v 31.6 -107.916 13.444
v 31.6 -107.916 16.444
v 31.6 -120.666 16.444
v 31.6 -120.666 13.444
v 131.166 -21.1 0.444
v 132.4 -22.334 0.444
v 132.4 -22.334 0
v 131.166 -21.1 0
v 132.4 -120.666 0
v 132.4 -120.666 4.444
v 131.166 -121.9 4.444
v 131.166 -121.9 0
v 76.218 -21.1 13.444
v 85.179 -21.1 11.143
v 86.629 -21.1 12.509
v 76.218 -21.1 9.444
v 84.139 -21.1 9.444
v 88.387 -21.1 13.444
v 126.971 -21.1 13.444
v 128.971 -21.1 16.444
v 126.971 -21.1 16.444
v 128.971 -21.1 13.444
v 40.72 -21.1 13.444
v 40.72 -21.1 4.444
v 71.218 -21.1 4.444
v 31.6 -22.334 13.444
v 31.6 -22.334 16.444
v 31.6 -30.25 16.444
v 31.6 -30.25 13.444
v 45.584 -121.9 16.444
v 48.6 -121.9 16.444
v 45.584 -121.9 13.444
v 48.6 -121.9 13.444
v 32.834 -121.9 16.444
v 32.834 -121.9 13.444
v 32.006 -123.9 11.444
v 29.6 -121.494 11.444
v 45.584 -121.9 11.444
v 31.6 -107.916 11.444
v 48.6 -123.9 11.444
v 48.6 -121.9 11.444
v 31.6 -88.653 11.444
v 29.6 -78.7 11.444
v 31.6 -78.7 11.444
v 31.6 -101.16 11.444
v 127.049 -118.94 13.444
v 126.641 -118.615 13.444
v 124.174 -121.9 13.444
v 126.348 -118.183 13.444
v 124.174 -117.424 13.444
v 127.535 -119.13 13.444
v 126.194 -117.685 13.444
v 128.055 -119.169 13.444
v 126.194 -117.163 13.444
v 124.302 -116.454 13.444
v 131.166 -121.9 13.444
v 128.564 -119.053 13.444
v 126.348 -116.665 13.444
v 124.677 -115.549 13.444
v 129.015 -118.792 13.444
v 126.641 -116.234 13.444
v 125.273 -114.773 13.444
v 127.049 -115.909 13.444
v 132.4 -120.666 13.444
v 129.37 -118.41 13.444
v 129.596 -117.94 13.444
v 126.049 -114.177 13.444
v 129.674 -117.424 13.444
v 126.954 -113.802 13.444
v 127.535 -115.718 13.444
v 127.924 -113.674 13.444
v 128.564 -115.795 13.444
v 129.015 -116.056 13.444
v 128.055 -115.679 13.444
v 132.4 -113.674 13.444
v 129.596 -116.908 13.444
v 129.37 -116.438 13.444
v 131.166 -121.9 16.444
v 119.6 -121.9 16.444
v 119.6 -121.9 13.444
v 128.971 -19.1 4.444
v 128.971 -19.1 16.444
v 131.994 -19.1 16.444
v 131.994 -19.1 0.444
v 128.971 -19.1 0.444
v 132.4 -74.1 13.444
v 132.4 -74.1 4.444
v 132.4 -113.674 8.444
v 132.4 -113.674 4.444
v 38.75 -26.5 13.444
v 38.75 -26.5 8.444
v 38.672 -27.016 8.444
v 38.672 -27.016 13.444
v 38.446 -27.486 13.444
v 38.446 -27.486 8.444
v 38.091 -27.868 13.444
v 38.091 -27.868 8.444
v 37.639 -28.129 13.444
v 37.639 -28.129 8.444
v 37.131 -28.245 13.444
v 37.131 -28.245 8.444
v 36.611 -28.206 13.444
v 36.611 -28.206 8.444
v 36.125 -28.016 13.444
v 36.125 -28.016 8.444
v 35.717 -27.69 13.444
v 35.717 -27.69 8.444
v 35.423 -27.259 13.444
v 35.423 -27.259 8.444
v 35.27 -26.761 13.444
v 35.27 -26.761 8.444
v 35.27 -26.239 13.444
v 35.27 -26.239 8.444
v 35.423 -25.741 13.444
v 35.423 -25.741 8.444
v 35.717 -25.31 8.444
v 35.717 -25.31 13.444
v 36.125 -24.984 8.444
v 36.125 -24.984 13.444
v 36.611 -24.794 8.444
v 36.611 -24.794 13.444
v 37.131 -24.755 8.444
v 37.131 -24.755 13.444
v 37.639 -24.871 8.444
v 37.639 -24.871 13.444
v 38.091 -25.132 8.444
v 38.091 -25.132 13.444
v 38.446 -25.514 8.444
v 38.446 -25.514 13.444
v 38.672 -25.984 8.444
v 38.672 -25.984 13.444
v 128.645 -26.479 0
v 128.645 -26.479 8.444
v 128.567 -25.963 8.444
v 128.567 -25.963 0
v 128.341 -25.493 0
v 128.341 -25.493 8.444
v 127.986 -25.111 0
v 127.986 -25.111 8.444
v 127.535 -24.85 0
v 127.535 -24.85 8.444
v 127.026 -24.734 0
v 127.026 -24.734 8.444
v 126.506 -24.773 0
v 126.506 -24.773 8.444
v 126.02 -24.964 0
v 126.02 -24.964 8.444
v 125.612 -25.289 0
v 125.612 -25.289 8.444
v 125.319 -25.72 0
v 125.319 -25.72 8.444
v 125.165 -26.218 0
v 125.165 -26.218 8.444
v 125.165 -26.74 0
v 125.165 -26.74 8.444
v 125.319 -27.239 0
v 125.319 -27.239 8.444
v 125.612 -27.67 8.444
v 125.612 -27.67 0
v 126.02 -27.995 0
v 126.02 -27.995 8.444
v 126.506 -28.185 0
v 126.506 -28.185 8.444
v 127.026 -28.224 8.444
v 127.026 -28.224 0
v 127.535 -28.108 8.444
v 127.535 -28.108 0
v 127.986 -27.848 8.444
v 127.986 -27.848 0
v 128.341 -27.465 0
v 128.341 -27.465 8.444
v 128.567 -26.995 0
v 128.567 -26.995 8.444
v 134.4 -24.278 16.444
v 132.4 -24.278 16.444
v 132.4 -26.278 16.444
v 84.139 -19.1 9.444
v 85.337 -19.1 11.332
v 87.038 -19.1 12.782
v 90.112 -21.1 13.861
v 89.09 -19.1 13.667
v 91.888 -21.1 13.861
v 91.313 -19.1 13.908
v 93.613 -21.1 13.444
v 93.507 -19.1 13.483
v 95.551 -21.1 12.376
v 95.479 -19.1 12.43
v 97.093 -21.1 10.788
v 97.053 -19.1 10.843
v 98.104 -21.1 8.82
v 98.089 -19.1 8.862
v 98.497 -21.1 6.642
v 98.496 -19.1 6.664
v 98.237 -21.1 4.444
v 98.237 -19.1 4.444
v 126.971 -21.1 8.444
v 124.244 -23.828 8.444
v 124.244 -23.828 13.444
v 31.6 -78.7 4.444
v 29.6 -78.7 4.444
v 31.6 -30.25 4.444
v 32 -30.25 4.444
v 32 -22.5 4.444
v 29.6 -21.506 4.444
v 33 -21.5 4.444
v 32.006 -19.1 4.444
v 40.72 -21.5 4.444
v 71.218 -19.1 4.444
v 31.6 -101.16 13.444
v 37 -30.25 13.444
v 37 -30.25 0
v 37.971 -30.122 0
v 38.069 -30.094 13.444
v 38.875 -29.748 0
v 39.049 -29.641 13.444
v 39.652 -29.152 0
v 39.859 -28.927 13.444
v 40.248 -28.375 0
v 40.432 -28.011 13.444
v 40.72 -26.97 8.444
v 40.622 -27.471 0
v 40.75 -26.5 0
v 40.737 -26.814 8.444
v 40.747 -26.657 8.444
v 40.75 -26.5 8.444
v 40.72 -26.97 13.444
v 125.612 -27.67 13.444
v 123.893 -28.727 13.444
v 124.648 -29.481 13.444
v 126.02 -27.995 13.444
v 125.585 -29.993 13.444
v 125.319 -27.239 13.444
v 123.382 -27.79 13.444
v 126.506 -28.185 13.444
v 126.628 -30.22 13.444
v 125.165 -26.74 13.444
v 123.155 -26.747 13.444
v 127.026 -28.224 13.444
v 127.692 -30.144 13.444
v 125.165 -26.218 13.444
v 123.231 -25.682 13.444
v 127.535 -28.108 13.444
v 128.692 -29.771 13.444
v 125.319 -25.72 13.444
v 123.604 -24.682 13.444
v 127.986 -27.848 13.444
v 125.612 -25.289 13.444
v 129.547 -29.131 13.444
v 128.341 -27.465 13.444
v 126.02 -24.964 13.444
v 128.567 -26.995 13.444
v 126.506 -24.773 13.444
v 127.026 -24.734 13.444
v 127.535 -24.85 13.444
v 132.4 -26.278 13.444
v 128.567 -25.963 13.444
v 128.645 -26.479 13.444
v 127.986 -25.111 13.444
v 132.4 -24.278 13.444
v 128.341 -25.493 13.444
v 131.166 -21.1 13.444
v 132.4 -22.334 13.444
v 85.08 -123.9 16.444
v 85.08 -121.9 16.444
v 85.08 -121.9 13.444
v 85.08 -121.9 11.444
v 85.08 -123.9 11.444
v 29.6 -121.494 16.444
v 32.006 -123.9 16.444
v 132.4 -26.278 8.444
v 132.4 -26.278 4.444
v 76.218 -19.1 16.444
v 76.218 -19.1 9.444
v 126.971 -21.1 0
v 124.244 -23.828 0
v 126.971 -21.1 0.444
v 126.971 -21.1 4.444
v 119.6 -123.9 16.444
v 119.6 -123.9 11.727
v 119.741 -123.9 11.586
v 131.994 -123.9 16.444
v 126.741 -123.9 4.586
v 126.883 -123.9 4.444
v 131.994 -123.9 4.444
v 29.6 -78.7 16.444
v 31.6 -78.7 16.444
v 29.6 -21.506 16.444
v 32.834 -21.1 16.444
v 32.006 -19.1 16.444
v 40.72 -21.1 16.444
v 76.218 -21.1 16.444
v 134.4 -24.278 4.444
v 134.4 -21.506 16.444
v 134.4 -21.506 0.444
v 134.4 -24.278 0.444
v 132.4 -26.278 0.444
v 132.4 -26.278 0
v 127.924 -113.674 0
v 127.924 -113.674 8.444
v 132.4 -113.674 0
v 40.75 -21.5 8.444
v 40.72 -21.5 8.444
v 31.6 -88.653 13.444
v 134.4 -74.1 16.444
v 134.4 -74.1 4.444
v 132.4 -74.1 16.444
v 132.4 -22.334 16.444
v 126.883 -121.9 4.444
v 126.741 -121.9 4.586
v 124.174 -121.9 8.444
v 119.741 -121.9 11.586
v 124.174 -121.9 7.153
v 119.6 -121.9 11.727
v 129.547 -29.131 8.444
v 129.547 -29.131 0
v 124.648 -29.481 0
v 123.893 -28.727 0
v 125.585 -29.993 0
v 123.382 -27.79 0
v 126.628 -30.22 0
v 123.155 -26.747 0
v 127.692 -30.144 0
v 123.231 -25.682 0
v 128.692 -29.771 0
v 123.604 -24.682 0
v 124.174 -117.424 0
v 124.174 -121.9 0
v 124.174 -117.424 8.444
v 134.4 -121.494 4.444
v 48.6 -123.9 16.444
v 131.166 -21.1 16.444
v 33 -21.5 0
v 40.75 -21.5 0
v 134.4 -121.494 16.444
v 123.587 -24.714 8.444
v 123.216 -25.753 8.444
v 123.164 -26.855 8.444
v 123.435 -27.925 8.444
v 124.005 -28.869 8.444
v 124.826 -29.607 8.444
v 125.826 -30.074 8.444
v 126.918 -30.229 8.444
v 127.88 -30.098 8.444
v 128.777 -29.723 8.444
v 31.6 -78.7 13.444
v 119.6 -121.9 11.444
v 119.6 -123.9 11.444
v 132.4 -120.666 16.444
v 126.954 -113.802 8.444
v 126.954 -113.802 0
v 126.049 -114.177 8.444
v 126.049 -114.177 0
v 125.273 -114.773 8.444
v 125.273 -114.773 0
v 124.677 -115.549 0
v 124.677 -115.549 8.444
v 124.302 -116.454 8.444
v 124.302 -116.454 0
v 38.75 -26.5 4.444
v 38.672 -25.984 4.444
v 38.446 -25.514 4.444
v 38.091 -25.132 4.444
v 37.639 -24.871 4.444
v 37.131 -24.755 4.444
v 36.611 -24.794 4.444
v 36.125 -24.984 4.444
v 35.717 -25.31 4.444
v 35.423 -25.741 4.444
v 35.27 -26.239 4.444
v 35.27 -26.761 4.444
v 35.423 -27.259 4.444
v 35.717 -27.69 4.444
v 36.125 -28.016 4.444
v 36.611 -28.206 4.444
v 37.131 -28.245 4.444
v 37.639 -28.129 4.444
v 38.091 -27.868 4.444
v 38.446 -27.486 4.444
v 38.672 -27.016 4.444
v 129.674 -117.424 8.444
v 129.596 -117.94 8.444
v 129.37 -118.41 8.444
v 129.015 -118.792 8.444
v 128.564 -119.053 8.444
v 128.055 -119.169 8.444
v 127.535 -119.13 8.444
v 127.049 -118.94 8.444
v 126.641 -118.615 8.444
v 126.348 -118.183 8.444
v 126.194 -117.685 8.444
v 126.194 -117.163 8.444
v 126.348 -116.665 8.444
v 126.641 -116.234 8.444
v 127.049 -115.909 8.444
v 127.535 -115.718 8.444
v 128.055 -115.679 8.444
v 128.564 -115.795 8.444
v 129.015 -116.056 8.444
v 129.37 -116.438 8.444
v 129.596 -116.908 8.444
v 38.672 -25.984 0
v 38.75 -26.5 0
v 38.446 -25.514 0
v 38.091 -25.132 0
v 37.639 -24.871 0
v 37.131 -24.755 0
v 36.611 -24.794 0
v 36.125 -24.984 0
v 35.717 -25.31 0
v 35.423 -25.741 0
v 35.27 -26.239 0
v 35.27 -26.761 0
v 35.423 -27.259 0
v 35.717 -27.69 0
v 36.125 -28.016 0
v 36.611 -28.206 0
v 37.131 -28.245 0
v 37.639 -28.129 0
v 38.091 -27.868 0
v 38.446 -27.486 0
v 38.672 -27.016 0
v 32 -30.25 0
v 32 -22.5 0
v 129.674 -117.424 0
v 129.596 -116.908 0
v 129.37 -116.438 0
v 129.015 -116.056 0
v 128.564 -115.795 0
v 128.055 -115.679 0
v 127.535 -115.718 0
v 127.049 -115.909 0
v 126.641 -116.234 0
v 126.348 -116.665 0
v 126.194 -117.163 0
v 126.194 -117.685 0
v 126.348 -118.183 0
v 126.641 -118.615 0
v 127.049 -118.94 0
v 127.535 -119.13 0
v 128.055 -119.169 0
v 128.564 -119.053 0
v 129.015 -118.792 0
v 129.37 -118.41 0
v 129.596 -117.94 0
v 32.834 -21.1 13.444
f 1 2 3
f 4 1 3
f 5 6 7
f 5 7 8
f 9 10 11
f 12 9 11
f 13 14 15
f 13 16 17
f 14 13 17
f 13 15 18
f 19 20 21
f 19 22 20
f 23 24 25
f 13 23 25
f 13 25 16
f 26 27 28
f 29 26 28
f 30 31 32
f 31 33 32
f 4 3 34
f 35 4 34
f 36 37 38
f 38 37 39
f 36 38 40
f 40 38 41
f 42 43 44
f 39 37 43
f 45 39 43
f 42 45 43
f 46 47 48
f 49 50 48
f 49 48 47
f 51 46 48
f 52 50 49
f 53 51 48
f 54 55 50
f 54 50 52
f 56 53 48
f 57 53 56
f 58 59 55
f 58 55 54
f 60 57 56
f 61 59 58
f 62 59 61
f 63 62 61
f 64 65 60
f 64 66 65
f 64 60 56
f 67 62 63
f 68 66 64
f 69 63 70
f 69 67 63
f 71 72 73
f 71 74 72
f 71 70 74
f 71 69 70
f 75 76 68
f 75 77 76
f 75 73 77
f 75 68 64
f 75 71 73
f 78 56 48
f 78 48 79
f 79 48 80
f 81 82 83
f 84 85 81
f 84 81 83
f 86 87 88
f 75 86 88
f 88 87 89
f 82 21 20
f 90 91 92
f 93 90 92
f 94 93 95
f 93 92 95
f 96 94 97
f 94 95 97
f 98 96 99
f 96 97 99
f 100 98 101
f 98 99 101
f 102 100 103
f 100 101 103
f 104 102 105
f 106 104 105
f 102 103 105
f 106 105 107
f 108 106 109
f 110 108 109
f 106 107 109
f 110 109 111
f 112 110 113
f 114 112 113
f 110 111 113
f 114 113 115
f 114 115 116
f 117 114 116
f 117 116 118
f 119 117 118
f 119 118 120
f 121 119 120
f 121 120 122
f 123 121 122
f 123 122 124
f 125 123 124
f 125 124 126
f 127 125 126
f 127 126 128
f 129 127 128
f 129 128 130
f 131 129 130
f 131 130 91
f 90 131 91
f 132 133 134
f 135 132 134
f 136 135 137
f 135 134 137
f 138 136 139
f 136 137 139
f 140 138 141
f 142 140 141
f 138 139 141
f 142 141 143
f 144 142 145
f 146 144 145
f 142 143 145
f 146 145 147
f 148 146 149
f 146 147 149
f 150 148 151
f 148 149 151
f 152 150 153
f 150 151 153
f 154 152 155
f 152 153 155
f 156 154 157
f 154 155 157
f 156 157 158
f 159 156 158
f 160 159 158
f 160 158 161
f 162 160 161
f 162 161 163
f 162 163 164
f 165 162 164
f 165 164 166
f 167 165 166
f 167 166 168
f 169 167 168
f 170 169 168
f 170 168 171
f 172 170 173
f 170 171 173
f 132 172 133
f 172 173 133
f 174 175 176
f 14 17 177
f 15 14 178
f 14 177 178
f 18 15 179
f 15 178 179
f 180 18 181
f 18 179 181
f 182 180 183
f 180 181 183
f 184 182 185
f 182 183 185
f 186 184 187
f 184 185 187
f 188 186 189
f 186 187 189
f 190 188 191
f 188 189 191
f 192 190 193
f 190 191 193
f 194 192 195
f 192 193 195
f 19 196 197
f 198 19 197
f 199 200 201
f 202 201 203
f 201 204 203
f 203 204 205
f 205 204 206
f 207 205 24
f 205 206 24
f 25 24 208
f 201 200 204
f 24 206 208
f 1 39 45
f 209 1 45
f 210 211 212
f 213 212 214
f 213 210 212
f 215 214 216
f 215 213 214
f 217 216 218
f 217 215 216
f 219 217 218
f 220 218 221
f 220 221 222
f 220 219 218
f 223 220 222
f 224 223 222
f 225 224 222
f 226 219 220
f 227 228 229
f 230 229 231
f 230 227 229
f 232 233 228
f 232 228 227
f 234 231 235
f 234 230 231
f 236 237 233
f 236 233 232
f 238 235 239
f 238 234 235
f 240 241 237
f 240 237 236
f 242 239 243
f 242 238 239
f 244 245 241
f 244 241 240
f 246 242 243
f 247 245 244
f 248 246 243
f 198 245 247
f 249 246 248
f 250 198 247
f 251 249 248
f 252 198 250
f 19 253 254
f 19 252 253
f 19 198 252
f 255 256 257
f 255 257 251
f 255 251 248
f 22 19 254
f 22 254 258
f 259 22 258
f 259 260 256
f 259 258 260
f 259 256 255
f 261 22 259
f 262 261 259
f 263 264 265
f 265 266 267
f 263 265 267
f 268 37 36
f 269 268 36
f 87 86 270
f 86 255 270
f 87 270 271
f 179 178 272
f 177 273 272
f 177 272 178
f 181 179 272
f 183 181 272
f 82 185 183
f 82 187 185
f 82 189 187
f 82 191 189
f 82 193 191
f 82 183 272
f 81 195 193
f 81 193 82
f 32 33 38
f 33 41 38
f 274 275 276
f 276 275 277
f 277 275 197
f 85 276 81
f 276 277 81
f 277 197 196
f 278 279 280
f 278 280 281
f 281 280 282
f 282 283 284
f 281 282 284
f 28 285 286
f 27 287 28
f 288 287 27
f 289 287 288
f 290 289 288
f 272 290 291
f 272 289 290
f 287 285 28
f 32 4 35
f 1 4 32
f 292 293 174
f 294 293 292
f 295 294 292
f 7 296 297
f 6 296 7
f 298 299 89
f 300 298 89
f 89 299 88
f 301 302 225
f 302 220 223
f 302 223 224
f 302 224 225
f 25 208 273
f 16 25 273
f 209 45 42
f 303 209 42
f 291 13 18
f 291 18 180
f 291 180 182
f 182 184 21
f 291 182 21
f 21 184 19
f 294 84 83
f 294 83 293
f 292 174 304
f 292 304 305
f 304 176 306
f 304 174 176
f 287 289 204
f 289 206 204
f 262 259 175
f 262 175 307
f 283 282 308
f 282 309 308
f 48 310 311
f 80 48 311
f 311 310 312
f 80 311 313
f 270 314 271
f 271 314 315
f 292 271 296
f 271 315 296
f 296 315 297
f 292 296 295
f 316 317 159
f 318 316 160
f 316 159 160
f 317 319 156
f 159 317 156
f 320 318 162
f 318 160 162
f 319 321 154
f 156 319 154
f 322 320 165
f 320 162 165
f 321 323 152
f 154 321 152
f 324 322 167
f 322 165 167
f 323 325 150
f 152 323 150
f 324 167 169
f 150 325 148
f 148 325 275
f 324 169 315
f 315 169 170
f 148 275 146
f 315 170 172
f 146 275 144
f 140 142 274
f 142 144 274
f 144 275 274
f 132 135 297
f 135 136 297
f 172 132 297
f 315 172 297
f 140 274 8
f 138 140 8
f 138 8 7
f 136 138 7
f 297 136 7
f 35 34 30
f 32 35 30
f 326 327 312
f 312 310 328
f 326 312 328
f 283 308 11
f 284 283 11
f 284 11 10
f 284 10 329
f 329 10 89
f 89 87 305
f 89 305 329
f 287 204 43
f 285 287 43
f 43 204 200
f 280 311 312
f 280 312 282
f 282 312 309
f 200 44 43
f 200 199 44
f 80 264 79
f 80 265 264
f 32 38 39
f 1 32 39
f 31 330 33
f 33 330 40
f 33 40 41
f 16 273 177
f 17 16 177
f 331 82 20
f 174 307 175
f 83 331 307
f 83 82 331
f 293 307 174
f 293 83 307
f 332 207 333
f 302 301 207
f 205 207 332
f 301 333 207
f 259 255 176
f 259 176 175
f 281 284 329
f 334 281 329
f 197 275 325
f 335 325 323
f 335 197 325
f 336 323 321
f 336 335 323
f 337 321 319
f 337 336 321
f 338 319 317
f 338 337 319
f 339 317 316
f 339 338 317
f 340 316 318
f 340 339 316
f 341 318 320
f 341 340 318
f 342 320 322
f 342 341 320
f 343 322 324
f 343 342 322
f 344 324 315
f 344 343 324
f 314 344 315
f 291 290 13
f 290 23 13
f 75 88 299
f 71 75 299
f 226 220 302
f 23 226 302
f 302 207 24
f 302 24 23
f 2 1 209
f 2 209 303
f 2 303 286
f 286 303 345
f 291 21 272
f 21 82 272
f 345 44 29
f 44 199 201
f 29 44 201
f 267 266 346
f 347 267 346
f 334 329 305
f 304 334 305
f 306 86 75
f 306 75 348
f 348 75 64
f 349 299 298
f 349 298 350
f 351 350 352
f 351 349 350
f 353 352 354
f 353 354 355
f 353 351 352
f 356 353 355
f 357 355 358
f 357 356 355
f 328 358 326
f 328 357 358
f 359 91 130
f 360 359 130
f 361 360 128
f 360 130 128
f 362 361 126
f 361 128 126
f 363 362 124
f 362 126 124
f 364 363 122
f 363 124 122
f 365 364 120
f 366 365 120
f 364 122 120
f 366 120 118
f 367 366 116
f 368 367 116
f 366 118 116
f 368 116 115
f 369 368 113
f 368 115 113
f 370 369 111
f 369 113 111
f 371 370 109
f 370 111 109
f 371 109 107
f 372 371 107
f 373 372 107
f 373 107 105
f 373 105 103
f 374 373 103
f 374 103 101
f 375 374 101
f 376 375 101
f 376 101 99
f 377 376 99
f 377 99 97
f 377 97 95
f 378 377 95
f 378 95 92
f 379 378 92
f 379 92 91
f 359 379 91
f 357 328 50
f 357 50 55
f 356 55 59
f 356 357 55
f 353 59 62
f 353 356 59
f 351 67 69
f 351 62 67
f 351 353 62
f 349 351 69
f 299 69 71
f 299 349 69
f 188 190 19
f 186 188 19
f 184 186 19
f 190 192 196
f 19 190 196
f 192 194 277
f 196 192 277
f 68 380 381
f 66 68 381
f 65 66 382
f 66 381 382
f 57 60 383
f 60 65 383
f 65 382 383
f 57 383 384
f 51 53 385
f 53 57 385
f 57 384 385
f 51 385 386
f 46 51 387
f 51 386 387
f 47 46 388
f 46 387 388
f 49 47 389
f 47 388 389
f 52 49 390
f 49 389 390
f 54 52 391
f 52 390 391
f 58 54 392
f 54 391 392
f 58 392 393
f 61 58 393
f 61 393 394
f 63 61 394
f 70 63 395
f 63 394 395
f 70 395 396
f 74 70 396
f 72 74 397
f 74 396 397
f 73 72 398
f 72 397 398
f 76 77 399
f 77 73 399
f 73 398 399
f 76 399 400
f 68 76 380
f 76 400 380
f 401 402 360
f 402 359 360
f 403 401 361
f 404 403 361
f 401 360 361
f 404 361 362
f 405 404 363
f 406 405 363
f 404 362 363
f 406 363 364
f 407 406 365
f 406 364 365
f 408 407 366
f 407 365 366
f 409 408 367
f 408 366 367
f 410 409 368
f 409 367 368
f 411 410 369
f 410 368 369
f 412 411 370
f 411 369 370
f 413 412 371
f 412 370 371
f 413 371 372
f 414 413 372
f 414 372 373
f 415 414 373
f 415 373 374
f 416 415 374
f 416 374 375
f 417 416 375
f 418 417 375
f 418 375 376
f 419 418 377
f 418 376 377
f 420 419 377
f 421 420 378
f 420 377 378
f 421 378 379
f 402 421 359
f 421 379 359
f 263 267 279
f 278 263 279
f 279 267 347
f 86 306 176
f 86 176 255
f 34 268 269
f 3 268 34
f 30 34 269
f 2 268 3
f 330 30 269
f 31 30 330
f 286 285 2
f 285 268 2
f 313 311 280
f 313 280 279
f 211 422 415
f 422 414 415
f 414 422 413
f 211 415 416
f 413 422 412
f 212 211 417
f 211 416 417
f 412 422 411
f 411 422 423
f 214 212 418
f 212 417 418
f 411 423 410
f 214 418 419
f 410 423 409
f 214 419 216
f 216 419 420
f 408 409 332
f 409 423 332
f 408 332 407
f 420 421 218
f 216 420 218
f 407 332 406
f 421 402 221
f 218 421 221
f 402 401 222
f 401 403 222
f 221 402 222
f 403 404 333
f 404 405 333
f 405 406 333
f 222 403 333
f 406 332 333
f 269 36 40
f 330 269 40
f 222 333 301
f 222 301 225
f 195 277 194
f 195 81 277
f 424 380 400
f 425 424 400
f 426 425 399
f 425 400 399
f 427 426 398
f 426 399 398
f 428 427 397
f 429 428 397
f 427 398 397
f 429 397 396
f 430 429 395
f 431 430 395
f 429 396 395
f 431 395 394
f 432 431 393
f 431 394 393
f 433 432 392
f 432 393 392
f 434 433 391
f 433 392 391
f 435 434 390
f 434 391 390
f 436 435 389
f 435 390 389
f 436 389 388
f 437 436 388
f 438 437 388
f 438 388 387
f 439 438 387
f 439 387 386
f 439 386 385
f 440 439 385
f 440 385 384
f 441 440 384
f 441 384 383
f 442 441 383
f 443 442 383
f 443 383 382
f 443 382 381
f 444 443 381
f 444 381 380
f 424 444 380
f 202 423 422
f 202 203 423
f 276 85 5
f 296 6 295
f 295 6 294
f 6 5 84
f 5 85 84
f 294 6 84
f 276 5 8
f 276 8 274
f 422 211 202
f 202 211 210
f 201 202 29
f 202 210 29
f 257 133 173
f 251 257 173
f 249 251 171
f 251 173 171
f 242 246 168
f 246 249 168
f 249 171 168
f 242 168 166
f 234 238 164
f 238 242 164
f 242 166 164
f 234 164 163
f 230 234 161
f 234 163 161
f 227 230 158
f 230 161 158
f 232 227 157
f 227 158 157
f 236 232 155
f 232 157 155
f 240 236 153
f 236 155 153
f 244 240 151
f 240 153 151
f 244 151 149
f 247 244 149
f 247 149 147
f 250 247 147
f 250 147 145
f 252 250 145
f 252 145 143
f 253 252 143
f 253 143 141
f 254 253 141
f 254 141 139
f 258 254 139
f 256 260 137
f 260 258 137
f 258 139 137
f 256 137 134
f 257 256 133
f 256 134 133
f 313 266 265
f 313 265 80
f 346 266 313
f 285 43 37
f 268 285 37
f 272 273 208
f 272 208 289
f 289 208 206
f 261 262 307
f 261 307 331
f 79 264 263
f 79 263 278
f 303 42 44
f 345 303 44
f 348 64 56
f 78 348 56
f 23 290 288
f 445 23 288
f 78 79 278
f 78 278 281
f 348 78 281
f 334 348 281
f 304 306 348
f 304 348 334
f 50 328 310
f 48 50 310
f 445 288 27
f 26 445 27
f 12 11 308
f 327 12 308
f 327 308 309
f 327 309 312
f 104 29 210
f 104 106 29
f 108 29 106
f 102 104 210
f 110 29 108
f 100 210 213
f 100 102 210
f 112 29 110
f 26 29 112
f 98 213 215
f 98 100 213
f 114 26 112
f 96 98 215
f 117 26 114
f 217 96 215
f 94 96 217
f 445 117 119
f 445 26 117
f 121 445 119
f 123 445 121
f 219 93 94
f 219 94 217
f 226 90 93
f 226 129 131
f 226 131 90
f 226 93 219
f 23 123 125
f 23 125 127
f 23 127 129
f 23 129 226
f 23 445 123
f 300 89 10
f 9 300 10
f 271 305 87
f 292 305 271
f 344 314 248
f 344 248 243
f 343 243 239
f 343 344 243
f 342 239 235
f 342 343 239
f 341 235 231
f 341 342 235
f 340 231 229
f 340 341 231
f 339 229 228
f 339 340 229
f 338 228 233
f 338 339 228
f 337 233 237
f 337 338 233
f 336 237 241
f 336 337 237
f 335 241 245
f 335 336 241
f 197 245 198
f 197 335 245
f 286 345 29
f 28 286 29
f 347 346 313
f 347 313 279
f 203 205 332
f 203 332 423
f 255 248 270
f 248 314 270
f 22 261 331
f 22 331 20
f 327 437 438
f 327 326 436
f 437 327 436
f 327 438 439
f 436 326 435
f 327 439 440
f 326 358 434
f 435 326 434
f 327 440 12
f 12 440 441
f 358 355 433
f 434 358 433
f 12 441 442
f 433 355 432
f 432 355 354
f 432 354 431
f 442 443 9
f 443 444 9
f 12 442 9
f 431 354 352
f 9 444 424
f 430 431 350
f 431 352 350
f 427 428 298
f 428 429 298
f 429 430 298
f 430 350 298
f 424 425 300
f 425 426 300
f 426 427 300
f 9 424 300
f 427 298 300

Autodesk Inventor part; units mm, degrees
ref_plane "YZ Plane" through (0, 0, 0) normal (1, 0, 0) x (0, 1, 0)
ref_plane "Work Plane1" through (0, 0, 8.4442) normal (0, 0, 1) x (1, 0, 0)
sketch "Sketch1" plane through (0, 0, 8.4442) normal (0, 0, 1) x (1, 0, 0)
  circle A0 centre (126.8952, -26.4793) radius 1.25 projected
  circle A1 centre (37, -26.5) radius 1.25 projected
  circle A2 centre (35.375, -94.25) radius 1.25 projected
  line L0 (132.4, -74.1) -> (132.4, -22.3343) projected
  line L1 (95.5398, -21.1) -> (95.5398, -19.1) projected
  line L2 (131.1657, -21.1) -> (95.5398, -21.1) projected
  line L3 (132.4, -22.3343) -> (131.1657, -21.1) projected
  line L4 (54.6, -116.9) -> (48.6, -116.9) projected
  line L5 (48.6, -116.9) -> (48.6, -121.9) projected
  line L6 (48.6, -121.9) -> (45.5843, -121.9) projected
  line L7 (45.5843, -121.9) -> (31.6, -107.9157) projected
  line L8 (31.6, -107.9157) -> (31.6, -78.9) projected
  line L9 (119.6, -121.9) -> (119.6, -123.9) projected
  line L10 (85.08, -121.9) -> (119.6, -121.9) projected
  line L11 (85.08, -121.9) -> (85.08, -95.9) projected
  line L12 (85.08, -95.9) -> (79.08, -95.9) projected
  line L13 (79.08, -95.9) -> (79.08, -121.9) projected
  line L14 (79.08, -121.9) -> (54.6, -121.9) projected
  line L15 (54.6, -121.9) -> (54.6, -116.9) projected
  circle A3 centre (82.08, -120.16) radius 1.4 projected
  circle A4 centre (51.6, -120.16) radius 1.4 projected
  circle A5 centre (82.08, -98.9) radius 1.4 projected
  line L16 (31.6, -78.9) -> (31.6, -22.3343) projected
  line L17 (31.6, -22.3343) -> (32.8343, -21.1) projected
  line L18 (32.8343, -21.1) -> (40.7204, -21.1) projected
  line L19 (40.7204, -21.1) -> (40.7204, -19.1) projected
  line L20 (126.6, -121.9) -> (126.6, -123.9) projected
  line L21 (126.6, -123.9) -> (131.9941, -123.9) projected
  line L22 (132.4, -74.1) -> (132.4, -120.6657) projected
  line L23 (132.4, -120.6657) -> (131.1657, -121.9) projected
  line L24 (131.1657, -121.9) -> (126.6, -121.9) projected
  line L25 (119.6, -123.9) -> (126.6, -123.9) projected
  line L26 (126.6, -121.9) -> (126.6, -123.9) projected
  line L27 (119.6, -121.9) -> (126.6, -121.9) projected
  line L28 (119.6, -121.9) -> (119.6, -123.9) projected
  circle A6 centre (127.9242, -117.4242) radius 1.25 projected
  line L29 (41.1204, -19.1) -> (41.1204, -21.5)
  line L30 (41.1204, -21.5) -> (33, -21.5)
  line L31 (33, -21.5) -> (32, -22.5)
  line L32 (32, -22.5) -> (32, -78.9)
  line L33 (32, -78.9) -> (32, -107.75)
  line L34 (32, -107.75) -> (45.75, -121.5)
  line L35 (45.75, -121.5) -> (48.2, -121.5)
  line L36 (48.2, -121.5) -> (48.2, -116.5)
  line L37 (48.2, -116.5) -> (55, -116.5)
  line L38 (55, -116.5) -> (55, -121.5)
  line L39 (55, -121.5) -> (78.68, -121.5)
  line L40 (78.68, -121.5) -> (78.68, -95.5)
  line L41 (78.68, -95.5) -> (85.48, -95.5)
  line L42 (85.48, -95.5) -> (85.48, -121.5)
  line L43 (85.48, -121.5) -> (119.6, -121.5)
  line L44 (37, -30.25) -> (31.6, -30.25) projected
  arc A7 (37, -30.25) -> (40.75, -26.5) centre (37, -26.5) ccw projected
  line L45 (40.75, -21.1) -> (40.75, -26.5) projected
  line L46 (123.1452, -26.4793) -> (123.1452, -21.1) projected
  arc A8 (123.1452, -26.4793) -> (126.8952, -30.2293) centre (126.8952, -26.4793) ccw projected
  line L47 (132.4, -30.2293) -> (126.8952, -30.2293) projected
  line L48 (127.9242, -113.6742) -> (132.4, -113.6742) projected
  arc A9 (127.9242, -113.6742) -> (124.1742, -117.4242) centre (127.9242, -117.4242) ccw projected
  line L49 (124.1742, -121.9) -> (124.1742, -117.4242) projected
  line L50 (31.6, -90.5) -> (35.375, -90.5) projected
  arc A10 (35.375, -98) -> (35.375, -90.5) centre (35.375, -94.25) ccw projected
  line L51 (35.375, -98) -> (31.6, -98) projected
  circle A11 centre (37, -26.5) radius 1.75
  circle A12 centre (35.375, -94.25) radius 1.75
  circle A13 centre (127.9242, -117.4242) radius 1.75
  circle A14 centre (126.8952, -26.4793) radius 1.75
  circle A15 centre (126.8952, -26.4793) radius 3.75
  line L52 (129.5469, -29.131) -> (132.4, -26.2779)
  line L53 (124.2436, -23.8277) -> (126.9713, -21.1)
  point P0 (0, 0)
  point P1 (32, -30.25)
  point P2 (40.75, -21.5)
  point P3 (32, -90.5)
  point P4 (32, -98)
  dimension "d0" = 0.4
  dimension "d1" = 3.5
  dimension "d2" = 3.5
  dimension "d3" = 3.5
  dimension "d4" = 3.5
  dimension "d9" = 45
  dimension "d10" = 45
ref_plane "Work Plane2" through (32, -121.5, 0) normal (0, 0, 1) x (1, 0, 0)
extrude "Extrusion1" add sketch "Sketch1" against normal up to surface (8.4442 mm away) contours L32 L31 L30 L45 A7 L44 | L22 L23 L24 L27 L49 A9 L48 | L52 A15 L53 L2 L3 L0 | A8 A15 | L33 L50 A10 L51
ref_plane "Work Plane3" through (82, -71.5, 4.4442) normal (0, 0, 1) x (1, 0, 0)
sketch "Sketch2" plane through (82, -71.5, 4.4442) normal (0, 0, 1) x (1, 0, 0)
  line L0 (44.6, -50.4) -> (44.6, -52.4) projected
  line L1 (44.6, -52.4) -> (49.9941, -52.4) projected
  line L2 (49.9941, -52.4) -> (52.4, -49.9941) projected
  line L3 (52.4, -49.9941) -> (52.4, -2.6) projected
  line L4 (52.4, -2.6) -> (50.4, -2.6) projected
  line L5 (50.4, -2.6) -> (50.4, -49.1657) projected
  line L6 (50.4, -49.1657) -> (49.1657, -50.4) projected
  line L7 (49.1657, -50.4) -> (44.6, -50.4) projected
  line L8 (37.6, -52.4) -> (44.6, -52.4) projected
  line L9 (44.6, -50.4) -> (44.6, -52.4) projected
  line L10 (37.6, -50.4) -> (44.6, -50.4) projected
  line L11 (37.6, -50.4) -> (37.6, -52.4) projected
  point P0 (-82, 71.5)
extrude "Extrusion2" add sketch "Sketch2" along normal blind 12
ref_plane "Work Plane4" through (116.8408, -46.6, 0.4442) normal (0, 0, 1) x (1, 0, 0)
sketch "Sketch3" plane through (116.8408, -46.6, 0.4442) normal (0, 0, 1) x (1, 0, 0)
  point P0 (-116.8408, 46.6)
ref_plane "Work Plane5" through (116.8408, -46.6, 0.4442) normal (0, 0, 1) x (1, 0, 0)
sketch "Sketch4" plane through (116.8408, -46.6, 0.4442) normal (0, 0, 1) x (1, 0, 0)
  line L0 (15.5592, -27.5) -> (15.5592, 24.2657) projected
  line L1 (17.5592, -27.5) -> (15.5592, -27.5) projected
  line L2 (17.5592, 25.0941) -> (17.5592, -27.5) projected
  line L3 (15.1533, 27.5) -> (17.5592, 25.0941) projected
  line L4 (-21.301, 27.5) -> (15.1533, 27.5) projected
  line L5 (-21.301, 25.5) -> (-21.301, 27.5) projected
  line L6 (14.3249, 25.5) -> (-21.301, 25.5) projected
  line L7 (15.5592, 24.2657) -> (14.3249, 25.5) projected
  line L8 (12.7061, 17.469) -> (15.5592, 20.3221) projected
  line L9 (15.5592, 20.3221) -> (17.5592, 22.3221)
  line L10 (10.1305, 25.5) -> (7.4028, 22.7723) projected
  line L11 (10.1305, 25.5) -> (12.1305, 27.5)
  point P0 (-116.8408, 46.6)
extrude "Extrusion3" add sketch "Sketch4" along normal up to surface (16 mm away) contours L0 L7 L6 L11 L4 L3 L2 L9
ref_plane "Work Plane6" through (82, -71.5, 4.4442) normal (0, 0, 1) x (1, 0, 0)
sketch "Sketch5" plane through (82, -71.5, 4.4442) normal (0, 0, 1) x (1, 0, 0)
  line L0 (-50.4, -7.4) -> (-52.4, -7.4) projected
  line L1 (-52.4, -7.4) -> (-50.4, -7.4) projected
  line L2 (-50.4, -7.4) -> (-50.4, 49.1657) projected
  line L3 (-50.4, 49.1657) -> (-49.1657, 50.4) projected
  line L4 (-49.1657, 50.4) -> (-41.2796, 50.4) projected
  line L5 (-41.2796, 50.4) -> (-41.2796, 52.4) projected
  line L6 (-41.2796, 52.4) -> (-49.9941, 52.4) projected
  line L7 (-49.9941, 52.4) -> (-52.4, 49.9941) projected
  line L8 (-52.4, 49.9941) -> (-52.4, -7.4) projected
  line L9 (-50.4, -7.2) -> (-52.4, -7.2)
  line L10 (-27.5075, 50.4) -> (-27.5075, 52.4) projected
  line L11 (-27.5075, 52.4) -> (-29.5996, 52.4) projected
  line L12 (-29.5996, 50.4) -> (-29.5996, 52.4) projected
  line L13 (-29.5996, 50.4) -> (-27.5075, 50.4) projected
  line L14 (-10.7816, 50.4) -> (-10.7816, 52.4) projected
  line L15 (-10.7816, 52.4) -> (-12.2675, 52.4) projected
  line L16 (-12.2675, 50.4) -> (-12.2675, 52.4) projected
  line L17 (-12.2675, 50.4) -> (-10.7816, 50.4) projected
  line L18 (-5.7816, 52.4) -> (-5.7816, 50.4) projected
  line L19 (-5.7816, 52.4) -> (-41.2796, 52.4)
  line L20 (-41.2796, 52.4) -> (-41.2796, 50.4)
  line L21 (-41.2796, 50.4) -> (-5.7816, 50.4)
  line L22 (-5.7816, 50.4) -> (-5.7816, 52.4)
  line L23 (-41.2796, 50.4) -> (-50.4, 50.4)
  line L24 (-50.4, 50.4) -> (-50.4, 41.25)
  line L25 (-50.4, 41.25) -> (-41.2796, 41.25)
  line L26 (-41.2796, 41.25) -> (-41.2796, 50.4)
  arc A0 (-45, 41.25) -> (-41.25, 45) centre (-45, 45) ccw projected
  circle A1 centre (-45, 45) radius 1.75 projected
  point P0 (-82, 71.5)
  point P1 (-51.4, -7.2)
  point P2 (-50, 41.25)
  point P3 (-41.2796, 44.5297)
  dimension "d13" = 0.2
extrude "Extrusion4" add sketch "Sketch5" along normal up to surface (12 mm away) contours L9 L8 L7 L6 L5 L4 L23 L24 L2 | L2 L3 L4 L26 A0 L25 | L24 L23 L3 | L19 L12 L21 L5 | L11 L10 L13 L12 | L19 L16 L21 L10 | L15 L14 L17 L16 | L19 L18 L21 L14
sketch "Sketch6" plane through (124.1742, -121.9, 8.4442) normal (0, 1, 0) x (1, 0, 0)
  line L0 (-4.5742, -3) -> (2.4258, 4) projected
  line L1 (-4.5742, 4) -> (-4.5742, -8) projected
  line L2 (0, 4) -> (-4.5742, 4) projected
  line L3 (-4.4328, -3.1414) -> (2.5672, 3.8586)
  line L4 (-4.2913, -3) -> (-4.5742, -3.2828)
  line L5 (2.5672, 3.8586) -> (2.7087, 4)
  line L6 (6.9915, 4) -> (0, 4) projected
  point P0 (-124.1742, 8.4442)
  point P1 (-4.4328, -3.1414)
  dimension "d16" = 0.2
extrude "Extrusion5" cut sketch "Sketch6" against normal blind 10
sketch "Sketch7" plane through (128.9713, -19.1, 0.4442) normal (0, 1, 0) x (1, 0, 0)
  arc A0 (-33.4314, 0) -> (-44.8319, -9) centre (-37.9713, -5.9699) ccw projected
  line L0 (-52.7529, -9) -> (-44.8319, -9) projected
  line L1 (0, 0) -> (0, -16) projected
  line L2 (-52.7529, -9) -> (0, -9)
  line L3 (0, -9) -> (0, -16)
  line L4 (0, -16) -> (-52.7529, -16)
  line L5 (-52.7529, -16) -> (-52.7529, -9)
  circle A1 centre (-37.9713, -5.9699) radius 7.5
  line L6 (5.4287, -4) -> (3.4287, -4) projected
  line L7 (3.4287, -4) -> (-52.7529, -4)
  line L8 (-52.7529, -4) -> (-52.7529, -16)
  line L9 (-52.7529, -16) -> (3.4287, -16)
  line L10 (3.4287, -16) -> (3.4287, -4)
  line L11 (3.0228, 0) -> (3.0228, -16) projected
  point P0 (-128.9713, 0.4442)
  point P1 (-31.1106, -9)
  point P2 (-45.2079, -4)
  point P3 (0, -4)
  point P4 (-30.7346, -4)
extrude "Extrusion6" add sketch "Sketch7" against normal up to surface (2 mm away) contours L7 L1 L2 A1 | A1 L2 L1 L4 L5 L0
sketch "Sketch8" plane through (128.9713, -19.1, 0.4442) normal (0, 1, 0) x (1, 0, 0)
  line L0 (-57.7529, -4) -> (-52.7529, -9) projected
  line L1 (-52.7529, -4) -> (-52.7529, -9) projected
  line L2 (-52.7529, -4) -> (-96.9654, -4) projected
  point P0 (-128.9713, 0.4442)
extrude "Extrusion7" cut sketch "Sketch8" against normal up to surface (2 mm away)
sketch "Sketch9" plane through (134.4, -121.4941, 4.4442) normal (1, 0, 0) x (0, 0, -1)
  line L0 (0, 47.3941) -> (-12, 47.3941) projected
  line L1 (4, 97.2162) -> (-12, 97.2162) projected
  line L2 (-12, 47.3941) -> (0, 47.3941)
  line L3 (0, 47.3941) -> (0, 97.2162)
  line L4 (0, 97.2162) -> (-12, 97.2162)
  line L5 (-12, 97.2162) -> (-12, 47.3941)
  point P0 (4.4442, 121.4941)
extrude "Extrusion8" add sketch "Sketch9" against normal up to surface (2 mm away)
ref_plane "Work Plane7" through (62.1, -101.4, 11.4442) normal (0, 0, 1) x (1, 0, 0)
sketch "Sketch10" plane through (62.1, -101.4, 11.4442) normal (0, 0, 1) x (1, 0, 0)
  line L0 (-7.5, -15.5) -> (-13.5, -15.5) projected
  line L1 (-13.5, -15.5) -> (-13.5, -20.5) projected
  line L2 (-13.5, -20.5) -> (-16.5157, -20.5) projected
  line L3 (-16.5157, -20.5) -> (-30.5, -6.5157) projected
  line L4 (-30.5, -6.5157) -> (-30.5, 22.5) projected
  line L5 (-30.5, 22.5) -> (-32.5, 22.5) projected
  line L6 (-32.5, 22.5) -> (-32.5, -20.0941) projected
  line L7 (-32.5, -20.0941) -> (-30.0941, -22.5) projected
  line L8 (-30.0941, -22.5) -> (57.5, -22.5) projected
  line L9 (57.5, -20.5) -> (57.5, -22.5) projected
  line L10 (22.98, -20.5) -> (57.5, -20.5) projected
  line L11 (22.98, -20.5) -> (22.98, 5.5) projected
  line L12 (22.98, 5.5) -> (16.98, 5.5) projected
  line L13 (16.98, 5.5) -> (16.98, -20.5) projected
  line L14 (16.98, -20.5) -> (-7.5, -20.5) projected
  line L15 (-7.5, -20.5) -> (-7.5, -15.5) projected
  circle A0 centre (19.98, -18.76) radius 1.4 projected
  circle A1 centre (-10.5, -18.76) radius 1.4 projected
  circle A2 centre (19.98, 2.5) radius 1.4 projected
  line L16 (57.5, -20.5) -> (22.98, -20.5)
  line L17 (22.98, -20.5) -> (22.98, -22.5)
  line L18 (22.98, -22.5) -> (57.5, -22.5)
  line L19 (57.5, -22.5) -> (57.5, -20.5)
  line L20 (-32.5, 22.7) -> (-30.5, 22.7) projected
  line L21 (-32.5, 22.7) -> (-30.5, 22.7)
  line L22 (-30.5, 22.7) -> (-30.5, -6.5157)
  line L23 (-30.5, -6.5157) -> (-32.5, -6.5157)
  line L24 (-32.5, -6.5157) -> (-32.5, 22.7)
  line L25 (-13.5, -20.5) -> (22.98, -20.5)
  line L26 (22.98, -20.5) -> (22.98, -22.5)
  line L27 (22.98, -22.5) -> (-13.5, -22.5)
  line L28 (-13.5, -22.5) -> (-13.5, -20.5)
  point P0 (-62.1, 101.4)
extrude "Extrusion9" add sketch "Sketch10" along normal up to surface (5 mm away) contours L28 L8 L7 L6 L23 L3 L2 | L10 L9 L8 L17 | L23 L6 L5 L4 | L5 L24 L20 L22
sketch "Sketch11" plane through (82, -71.5, 16.4442) normal (0, 0, 1) x (1, 0, 0)
  line L0 (-49.9941, -52.4) -> (-52.4, -49.9941) projected
  line L1 (-33.4, -52.4) -> (-49.9941, -52.4) projected
  line L2 (-52.4, -49.9941) -> (-52.4, 49.9941) projected
  line L3 (-52.4, 49.9941) -> (-49.9941, 52.4) projected
  line L4 (-49.9941, 52.4) -> (49.9941, 52.4) projected
  line L5 (49.9941, 52.4) -> (52.4, 49.9941) projected
  line L6 (52.4, -49.9941) -> (52.4, 49.9941) projected
  line L7 (49.9941, -52.4) -> (52.4, -49.9941) projected
  line L8 (49.9941, -52.4) -> (3.08, -52.4) projected
  line L9 (3.08, -50.4) -> (49.1657, -50.4)
  line L10 (49.1657, -50.4) -> (50.4, -49.1657)
  line L11 (50.4, -49.1657) -> (50.4, 49.1657)
  line L12 (50.4, 49.1657) -> (49.1657, 50.4)
  line L13 (49.1657, 50.4) -> (-49.1657, 50.4)
  line L14 (-49.1657, 50.4) -> (-50.4, 49.1657)
  line L15 (-50.4, 49.1657) -> (-50.4, -49.1657)
  line L16 (-50.4, -49.1657) -> (-49.1657, -50.4)
  line L17 (-49.1657, -50.4) -> (-33.4, -50.4)
  line L18 (3.08, -50.4) -> (-33.4, -50.4)
  point P0 (-82, 71.5)
  dimension "d27" = 2
extrude "Extrusion10" cut sketch "Sketch11" against normal blind 3
sketch "Sketch12" plane through (0, 0, 8.4442) normal (0, 0, 1) x (1, 0, 0)
  line L0 (35.375, -90.5) -> (32, -90.5) projected
  line L1 (32, -90.5) -> (32, -98) projected
  line L2 (32, -98) -> (35.375, -98) projected
  arc A0 (35.375, -98) -> (35.375, -90.5) centre (35.375, -94.25) ccw projected
  circle A1 centre (35.375, -94.25) radius 1.75 projected
  line L3 (39.1, -90.75) -> (31.6, -90.75) projected
  line L4 (31.6, -90.75) -> (31.6, -120.6657) projected
  line L5 (31.6, -120.6657) -> (32.8343, -121.9) projected
  line L6 (32.8343, -121.9) -> (48.6, -121.9) projected
  line L7 (48.6, -121.9) -> (48.6, -117.0555) projected
  line L8 (48.6, -95.9) -> (91.08, -95.9) projected
  line L9 (91.08, -121.9) -> (131.1657, -121.9) projected
  line L10 (131.1657, -121.9) -> (132.4, -120.6657) projected
  line L11 (132.4, -120.6657) -> (132.4, -22.3343) projected
  line L12 (132.4, -22.3343) -> (131.1657, -21.1) projected
  line L13 (131.1657, -21.1) -> (32.8343, -21.1) projected
  line L14 (32.8343, -21.1) -> (31.6, -22.3343) projected
  line L15 (31.6, -22.3343) -> (31.6, -43.25) projected
  line L16 (31.6, -43.25) -> (39.1, -43.25) projected
  line L17 (39.1, -43.25) -> (39.1, -90.75) projected
  circle A2 centre (127.9242, -117.4242) radius 1.75 projected
  circle A3 centre (126.8952, -26.4793) radius 1.75 projected
  line L18 (39.1, -90.75) -> (31.6, -90.75) projected
  line L19 (31.6, -90.75) -> (31.6, -120.6657) projected
  line L20 (31.6, -120.6657) -> (32.8343, -121.9) projected
  line L21 (32.8343, -121.9) -> (48.6, -121.9) projected
  line L22 (48.6, -121.9) -> (48.6, -117.0555) projected
  line L23 (48.6, -95.9) -> (91.08, -95.9) projected
  line L24 (91.08, -121.9) -> (131.1657, -121.9) projected
  line L25 (131.1657, -121.9) -> (132.4, -120.6657) projected
  line L26 (132.4, -120.6657) -> (132.4, -22.3343) projected
  line L27 (132.4, -22.3343) -> (131.1657, -21.1) projected
  line L28 (131.1657, -21.1) -> (32.8343, -21.1) projected
  line L29 (32.8343, -21.1) -> (31.6, -22.3343) projected
  line L30 (31.6, -22.3343) -> (31.6, -43.25) projected
  line L31 (31.6, -43.25) -> (39.1, -43.25) projected
  line L32 (39.1, -43.25) -> (39.1, -90.75) projected
  circle A4 centre (127.9242, -117.4242) radius 1.75 projected
  circle A5 centre (126.8952, -26.4793) radius 1.75 projected
  arc A6 (124.2436, -23.8277) -> (129.5469, -29.131) centre (126.8952, -26.4793) ccw projected
  line L33 (129.5469, -29.131) -> (132.4, -26.2779) projected
  line L34 (126.9713, -21.1) -> (124.2436, -23.8277) projected
  line L35 (124.1742, -117.4242) -> (124.1742, -121.9) projected
  arc A7 (127.9242, -113.6742) -> (124.1742, -117.4242) centre (127.9242, -117.4242) ccw projected
  line L36 (132.4, -113.6742) -> (127.9242, -113.6742) projected
  line L37 (124.1742, -121.9) -> (131.1657, -121.9) projected
  line L38 (131.1657, -121.9) -> (132.4, -120.6657) projected
  line L39 (132.4, -120.6657) -> (132.4, -113.6742) projected
  line L40 (47.8517, -103.0555) -> (48.6, -103.0555) projected
  line L41 (48.6, -103.0555) -> (48.6, -95.9) projected
  line L42 (48.6, -117.0555) -> (47.8517, -117.0555) projected
  line L43 (47.8517, -117.0555) -> (47.8517, -103.0555) projected
  line L44 (47.8517, -103.0555) -> (48.6, -103.0555) projected
  line L45 (48.6, -103.0555) -> (48.6, -95.9) projected
  line L46 (48.6, -117.0555) -> (47.8517, -117.0555) projected
  line L47 (47.8517, -117.0555) -> (47.8517, -103.0555) projected
  line L48 (91.08, -95.9) -> (91.08, -121.9) projected
  line L49 (91.08, -95.9) -> (91.08, -121.9) projected
  point P0 (0, 0)
  point P1 (85.08, -95.9)
  point P2 (85.08, -121.9)
ref_plane "Work Plane8" through (31.6, -121.9, 13.4442) normal (0, 0, -1) x (0, 1, 0)
extrude "Extrusion11" add sketch "Sketch12" along normal up to surface (5 mm away) contours A0 L3 L1 L0 | A0 L2 L1 L3 | L13 L12 L11 L33 A6 L34 | L11 L10 L9 L35 A7 L36
sketch "Sketch13" plane through (32, -98, 13.4442) normal (0, 0, 1) x (1, 0, 0)
  line L0 (8.6884, -3.1598) -> (-0.4, -3.1598)
  line L1 (-0.4, -3.1598) -> (-0.4, 9.3466)
  line L2 (-0.4, 9.3466) -> (8.6884, 9.3466)
  line L3 (8.6884, 9.3466) -> (8.6884, -3.1598)
  line L4 (-0.4, -22.6657) -> (-0.4, 75.6657) projected
  point P0 (-32, 98)
extrude "Extrusion12" cut sketch "Sketch13" against normal up to surface (13.4442 mm away)
properties part number "Lid_1"
